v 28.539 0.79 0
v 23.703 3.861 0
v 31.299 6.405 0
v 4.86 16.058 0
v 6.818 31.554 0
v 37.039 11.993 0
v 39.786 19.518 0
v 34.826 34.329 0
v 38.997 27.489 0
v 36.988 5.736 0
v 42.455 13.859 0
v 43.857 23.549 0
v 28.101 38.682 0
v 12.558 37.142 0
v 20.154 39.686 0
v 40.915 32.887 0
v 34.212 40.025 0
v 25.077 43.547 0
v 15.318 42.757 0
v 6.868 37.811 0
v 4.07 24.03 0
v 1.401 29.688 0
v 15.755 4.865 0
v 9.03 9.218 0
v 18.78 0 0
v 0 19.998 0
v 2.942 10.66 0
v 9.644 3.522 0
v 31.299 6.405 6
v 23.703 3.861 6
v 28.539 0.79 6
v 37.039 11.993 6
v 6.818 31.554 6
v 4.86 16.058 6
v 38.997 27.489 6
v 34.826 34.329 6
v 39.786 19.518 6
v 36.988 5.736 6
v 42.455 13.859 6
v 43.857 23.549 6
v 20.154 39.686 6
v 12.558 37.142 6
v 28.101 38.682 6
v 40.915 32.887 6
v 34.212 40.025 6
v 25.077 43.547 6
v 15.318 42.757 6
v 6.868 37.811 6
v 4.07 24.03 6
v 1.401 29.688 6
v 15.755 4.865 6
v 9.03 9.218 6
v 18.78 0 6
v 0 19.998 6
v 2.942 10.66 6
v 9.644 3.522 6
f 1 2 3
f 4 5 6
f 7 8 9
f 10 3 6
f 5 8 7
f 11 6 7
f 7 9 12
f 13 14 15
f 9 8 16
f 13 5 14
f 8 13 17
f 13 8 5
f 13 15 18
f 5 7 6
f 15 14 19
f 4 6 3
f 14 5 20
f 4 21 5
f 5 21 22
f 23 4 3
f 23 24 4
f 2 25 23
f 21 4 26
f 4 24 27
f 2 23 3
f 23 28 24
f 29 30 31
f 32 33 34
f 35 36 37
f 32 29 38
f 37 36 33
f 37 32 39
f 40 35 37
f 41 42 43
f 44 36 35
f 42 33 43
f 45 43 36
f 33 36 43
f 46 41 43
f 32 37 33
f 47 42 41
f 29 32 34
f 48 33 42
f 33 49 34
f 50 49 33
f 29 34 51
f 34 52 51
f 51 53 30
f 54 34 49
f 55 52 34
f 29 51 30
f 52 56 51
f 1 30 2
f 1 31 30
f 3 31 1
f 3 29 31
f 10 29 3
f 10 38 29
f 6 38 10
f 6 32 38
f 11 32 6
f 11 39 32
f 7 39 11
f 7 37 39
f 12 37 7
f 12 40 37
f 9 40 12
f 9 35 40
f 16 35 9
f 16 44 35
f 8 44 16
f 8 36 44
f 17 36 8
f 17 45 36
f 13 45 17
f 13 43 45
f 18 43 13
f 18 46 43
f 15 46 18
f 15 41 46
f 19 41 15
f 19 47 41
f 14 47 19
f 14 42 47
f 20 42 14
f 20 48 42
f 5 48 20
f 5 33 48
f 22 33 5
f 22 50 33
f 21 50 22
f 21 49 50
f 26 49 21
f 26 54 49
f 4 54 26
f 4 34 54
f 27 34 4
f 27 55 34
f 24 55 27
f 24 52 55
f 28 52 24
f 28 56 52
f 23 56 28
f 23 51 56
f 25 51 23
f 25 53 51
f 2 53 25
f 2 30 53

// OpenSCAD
$fn = 32;

// ----------------------------------------------------------------------
// Chain sprocket: 14 teeth, 18 mm root radius
// ----------------------------------------------------------------------

// --- parameters (mm) ---
profile_height = 6;       // extrusion height
profile_points = 28;      // points of the closed outline

profile = [[39.786, 19.518], [43.857, 23.549], [38.997, 27.489], [40.915, 32.887], [34.826, 34.329], [34.212, 40.025], [28.101, 38.682], [25.077, 43.547], [20.154, 39.686], [15.318, 42.757], [12.558, 37.142], [6.868, 37.811], [6.818, 31.554], [1.401, 29.688], [4.07, 24.03], [0, 19.998], [4.86, 16.058], [2.942, 10.66], [9.03, 9.218], [9.644, 3.522], [15.755, 4.865], [18.78, 0], [23.703, 3.861], [28.539, 0.79], [31.299, 6.405], [36.988, 5.736], [37.039, 11.993], [42.455, 13.859]];  // single closed polygon, 28 points, counter clockwise

// --- the one profile operation ---
linear_extrude(height = profile_height) polygon(points = profile);
